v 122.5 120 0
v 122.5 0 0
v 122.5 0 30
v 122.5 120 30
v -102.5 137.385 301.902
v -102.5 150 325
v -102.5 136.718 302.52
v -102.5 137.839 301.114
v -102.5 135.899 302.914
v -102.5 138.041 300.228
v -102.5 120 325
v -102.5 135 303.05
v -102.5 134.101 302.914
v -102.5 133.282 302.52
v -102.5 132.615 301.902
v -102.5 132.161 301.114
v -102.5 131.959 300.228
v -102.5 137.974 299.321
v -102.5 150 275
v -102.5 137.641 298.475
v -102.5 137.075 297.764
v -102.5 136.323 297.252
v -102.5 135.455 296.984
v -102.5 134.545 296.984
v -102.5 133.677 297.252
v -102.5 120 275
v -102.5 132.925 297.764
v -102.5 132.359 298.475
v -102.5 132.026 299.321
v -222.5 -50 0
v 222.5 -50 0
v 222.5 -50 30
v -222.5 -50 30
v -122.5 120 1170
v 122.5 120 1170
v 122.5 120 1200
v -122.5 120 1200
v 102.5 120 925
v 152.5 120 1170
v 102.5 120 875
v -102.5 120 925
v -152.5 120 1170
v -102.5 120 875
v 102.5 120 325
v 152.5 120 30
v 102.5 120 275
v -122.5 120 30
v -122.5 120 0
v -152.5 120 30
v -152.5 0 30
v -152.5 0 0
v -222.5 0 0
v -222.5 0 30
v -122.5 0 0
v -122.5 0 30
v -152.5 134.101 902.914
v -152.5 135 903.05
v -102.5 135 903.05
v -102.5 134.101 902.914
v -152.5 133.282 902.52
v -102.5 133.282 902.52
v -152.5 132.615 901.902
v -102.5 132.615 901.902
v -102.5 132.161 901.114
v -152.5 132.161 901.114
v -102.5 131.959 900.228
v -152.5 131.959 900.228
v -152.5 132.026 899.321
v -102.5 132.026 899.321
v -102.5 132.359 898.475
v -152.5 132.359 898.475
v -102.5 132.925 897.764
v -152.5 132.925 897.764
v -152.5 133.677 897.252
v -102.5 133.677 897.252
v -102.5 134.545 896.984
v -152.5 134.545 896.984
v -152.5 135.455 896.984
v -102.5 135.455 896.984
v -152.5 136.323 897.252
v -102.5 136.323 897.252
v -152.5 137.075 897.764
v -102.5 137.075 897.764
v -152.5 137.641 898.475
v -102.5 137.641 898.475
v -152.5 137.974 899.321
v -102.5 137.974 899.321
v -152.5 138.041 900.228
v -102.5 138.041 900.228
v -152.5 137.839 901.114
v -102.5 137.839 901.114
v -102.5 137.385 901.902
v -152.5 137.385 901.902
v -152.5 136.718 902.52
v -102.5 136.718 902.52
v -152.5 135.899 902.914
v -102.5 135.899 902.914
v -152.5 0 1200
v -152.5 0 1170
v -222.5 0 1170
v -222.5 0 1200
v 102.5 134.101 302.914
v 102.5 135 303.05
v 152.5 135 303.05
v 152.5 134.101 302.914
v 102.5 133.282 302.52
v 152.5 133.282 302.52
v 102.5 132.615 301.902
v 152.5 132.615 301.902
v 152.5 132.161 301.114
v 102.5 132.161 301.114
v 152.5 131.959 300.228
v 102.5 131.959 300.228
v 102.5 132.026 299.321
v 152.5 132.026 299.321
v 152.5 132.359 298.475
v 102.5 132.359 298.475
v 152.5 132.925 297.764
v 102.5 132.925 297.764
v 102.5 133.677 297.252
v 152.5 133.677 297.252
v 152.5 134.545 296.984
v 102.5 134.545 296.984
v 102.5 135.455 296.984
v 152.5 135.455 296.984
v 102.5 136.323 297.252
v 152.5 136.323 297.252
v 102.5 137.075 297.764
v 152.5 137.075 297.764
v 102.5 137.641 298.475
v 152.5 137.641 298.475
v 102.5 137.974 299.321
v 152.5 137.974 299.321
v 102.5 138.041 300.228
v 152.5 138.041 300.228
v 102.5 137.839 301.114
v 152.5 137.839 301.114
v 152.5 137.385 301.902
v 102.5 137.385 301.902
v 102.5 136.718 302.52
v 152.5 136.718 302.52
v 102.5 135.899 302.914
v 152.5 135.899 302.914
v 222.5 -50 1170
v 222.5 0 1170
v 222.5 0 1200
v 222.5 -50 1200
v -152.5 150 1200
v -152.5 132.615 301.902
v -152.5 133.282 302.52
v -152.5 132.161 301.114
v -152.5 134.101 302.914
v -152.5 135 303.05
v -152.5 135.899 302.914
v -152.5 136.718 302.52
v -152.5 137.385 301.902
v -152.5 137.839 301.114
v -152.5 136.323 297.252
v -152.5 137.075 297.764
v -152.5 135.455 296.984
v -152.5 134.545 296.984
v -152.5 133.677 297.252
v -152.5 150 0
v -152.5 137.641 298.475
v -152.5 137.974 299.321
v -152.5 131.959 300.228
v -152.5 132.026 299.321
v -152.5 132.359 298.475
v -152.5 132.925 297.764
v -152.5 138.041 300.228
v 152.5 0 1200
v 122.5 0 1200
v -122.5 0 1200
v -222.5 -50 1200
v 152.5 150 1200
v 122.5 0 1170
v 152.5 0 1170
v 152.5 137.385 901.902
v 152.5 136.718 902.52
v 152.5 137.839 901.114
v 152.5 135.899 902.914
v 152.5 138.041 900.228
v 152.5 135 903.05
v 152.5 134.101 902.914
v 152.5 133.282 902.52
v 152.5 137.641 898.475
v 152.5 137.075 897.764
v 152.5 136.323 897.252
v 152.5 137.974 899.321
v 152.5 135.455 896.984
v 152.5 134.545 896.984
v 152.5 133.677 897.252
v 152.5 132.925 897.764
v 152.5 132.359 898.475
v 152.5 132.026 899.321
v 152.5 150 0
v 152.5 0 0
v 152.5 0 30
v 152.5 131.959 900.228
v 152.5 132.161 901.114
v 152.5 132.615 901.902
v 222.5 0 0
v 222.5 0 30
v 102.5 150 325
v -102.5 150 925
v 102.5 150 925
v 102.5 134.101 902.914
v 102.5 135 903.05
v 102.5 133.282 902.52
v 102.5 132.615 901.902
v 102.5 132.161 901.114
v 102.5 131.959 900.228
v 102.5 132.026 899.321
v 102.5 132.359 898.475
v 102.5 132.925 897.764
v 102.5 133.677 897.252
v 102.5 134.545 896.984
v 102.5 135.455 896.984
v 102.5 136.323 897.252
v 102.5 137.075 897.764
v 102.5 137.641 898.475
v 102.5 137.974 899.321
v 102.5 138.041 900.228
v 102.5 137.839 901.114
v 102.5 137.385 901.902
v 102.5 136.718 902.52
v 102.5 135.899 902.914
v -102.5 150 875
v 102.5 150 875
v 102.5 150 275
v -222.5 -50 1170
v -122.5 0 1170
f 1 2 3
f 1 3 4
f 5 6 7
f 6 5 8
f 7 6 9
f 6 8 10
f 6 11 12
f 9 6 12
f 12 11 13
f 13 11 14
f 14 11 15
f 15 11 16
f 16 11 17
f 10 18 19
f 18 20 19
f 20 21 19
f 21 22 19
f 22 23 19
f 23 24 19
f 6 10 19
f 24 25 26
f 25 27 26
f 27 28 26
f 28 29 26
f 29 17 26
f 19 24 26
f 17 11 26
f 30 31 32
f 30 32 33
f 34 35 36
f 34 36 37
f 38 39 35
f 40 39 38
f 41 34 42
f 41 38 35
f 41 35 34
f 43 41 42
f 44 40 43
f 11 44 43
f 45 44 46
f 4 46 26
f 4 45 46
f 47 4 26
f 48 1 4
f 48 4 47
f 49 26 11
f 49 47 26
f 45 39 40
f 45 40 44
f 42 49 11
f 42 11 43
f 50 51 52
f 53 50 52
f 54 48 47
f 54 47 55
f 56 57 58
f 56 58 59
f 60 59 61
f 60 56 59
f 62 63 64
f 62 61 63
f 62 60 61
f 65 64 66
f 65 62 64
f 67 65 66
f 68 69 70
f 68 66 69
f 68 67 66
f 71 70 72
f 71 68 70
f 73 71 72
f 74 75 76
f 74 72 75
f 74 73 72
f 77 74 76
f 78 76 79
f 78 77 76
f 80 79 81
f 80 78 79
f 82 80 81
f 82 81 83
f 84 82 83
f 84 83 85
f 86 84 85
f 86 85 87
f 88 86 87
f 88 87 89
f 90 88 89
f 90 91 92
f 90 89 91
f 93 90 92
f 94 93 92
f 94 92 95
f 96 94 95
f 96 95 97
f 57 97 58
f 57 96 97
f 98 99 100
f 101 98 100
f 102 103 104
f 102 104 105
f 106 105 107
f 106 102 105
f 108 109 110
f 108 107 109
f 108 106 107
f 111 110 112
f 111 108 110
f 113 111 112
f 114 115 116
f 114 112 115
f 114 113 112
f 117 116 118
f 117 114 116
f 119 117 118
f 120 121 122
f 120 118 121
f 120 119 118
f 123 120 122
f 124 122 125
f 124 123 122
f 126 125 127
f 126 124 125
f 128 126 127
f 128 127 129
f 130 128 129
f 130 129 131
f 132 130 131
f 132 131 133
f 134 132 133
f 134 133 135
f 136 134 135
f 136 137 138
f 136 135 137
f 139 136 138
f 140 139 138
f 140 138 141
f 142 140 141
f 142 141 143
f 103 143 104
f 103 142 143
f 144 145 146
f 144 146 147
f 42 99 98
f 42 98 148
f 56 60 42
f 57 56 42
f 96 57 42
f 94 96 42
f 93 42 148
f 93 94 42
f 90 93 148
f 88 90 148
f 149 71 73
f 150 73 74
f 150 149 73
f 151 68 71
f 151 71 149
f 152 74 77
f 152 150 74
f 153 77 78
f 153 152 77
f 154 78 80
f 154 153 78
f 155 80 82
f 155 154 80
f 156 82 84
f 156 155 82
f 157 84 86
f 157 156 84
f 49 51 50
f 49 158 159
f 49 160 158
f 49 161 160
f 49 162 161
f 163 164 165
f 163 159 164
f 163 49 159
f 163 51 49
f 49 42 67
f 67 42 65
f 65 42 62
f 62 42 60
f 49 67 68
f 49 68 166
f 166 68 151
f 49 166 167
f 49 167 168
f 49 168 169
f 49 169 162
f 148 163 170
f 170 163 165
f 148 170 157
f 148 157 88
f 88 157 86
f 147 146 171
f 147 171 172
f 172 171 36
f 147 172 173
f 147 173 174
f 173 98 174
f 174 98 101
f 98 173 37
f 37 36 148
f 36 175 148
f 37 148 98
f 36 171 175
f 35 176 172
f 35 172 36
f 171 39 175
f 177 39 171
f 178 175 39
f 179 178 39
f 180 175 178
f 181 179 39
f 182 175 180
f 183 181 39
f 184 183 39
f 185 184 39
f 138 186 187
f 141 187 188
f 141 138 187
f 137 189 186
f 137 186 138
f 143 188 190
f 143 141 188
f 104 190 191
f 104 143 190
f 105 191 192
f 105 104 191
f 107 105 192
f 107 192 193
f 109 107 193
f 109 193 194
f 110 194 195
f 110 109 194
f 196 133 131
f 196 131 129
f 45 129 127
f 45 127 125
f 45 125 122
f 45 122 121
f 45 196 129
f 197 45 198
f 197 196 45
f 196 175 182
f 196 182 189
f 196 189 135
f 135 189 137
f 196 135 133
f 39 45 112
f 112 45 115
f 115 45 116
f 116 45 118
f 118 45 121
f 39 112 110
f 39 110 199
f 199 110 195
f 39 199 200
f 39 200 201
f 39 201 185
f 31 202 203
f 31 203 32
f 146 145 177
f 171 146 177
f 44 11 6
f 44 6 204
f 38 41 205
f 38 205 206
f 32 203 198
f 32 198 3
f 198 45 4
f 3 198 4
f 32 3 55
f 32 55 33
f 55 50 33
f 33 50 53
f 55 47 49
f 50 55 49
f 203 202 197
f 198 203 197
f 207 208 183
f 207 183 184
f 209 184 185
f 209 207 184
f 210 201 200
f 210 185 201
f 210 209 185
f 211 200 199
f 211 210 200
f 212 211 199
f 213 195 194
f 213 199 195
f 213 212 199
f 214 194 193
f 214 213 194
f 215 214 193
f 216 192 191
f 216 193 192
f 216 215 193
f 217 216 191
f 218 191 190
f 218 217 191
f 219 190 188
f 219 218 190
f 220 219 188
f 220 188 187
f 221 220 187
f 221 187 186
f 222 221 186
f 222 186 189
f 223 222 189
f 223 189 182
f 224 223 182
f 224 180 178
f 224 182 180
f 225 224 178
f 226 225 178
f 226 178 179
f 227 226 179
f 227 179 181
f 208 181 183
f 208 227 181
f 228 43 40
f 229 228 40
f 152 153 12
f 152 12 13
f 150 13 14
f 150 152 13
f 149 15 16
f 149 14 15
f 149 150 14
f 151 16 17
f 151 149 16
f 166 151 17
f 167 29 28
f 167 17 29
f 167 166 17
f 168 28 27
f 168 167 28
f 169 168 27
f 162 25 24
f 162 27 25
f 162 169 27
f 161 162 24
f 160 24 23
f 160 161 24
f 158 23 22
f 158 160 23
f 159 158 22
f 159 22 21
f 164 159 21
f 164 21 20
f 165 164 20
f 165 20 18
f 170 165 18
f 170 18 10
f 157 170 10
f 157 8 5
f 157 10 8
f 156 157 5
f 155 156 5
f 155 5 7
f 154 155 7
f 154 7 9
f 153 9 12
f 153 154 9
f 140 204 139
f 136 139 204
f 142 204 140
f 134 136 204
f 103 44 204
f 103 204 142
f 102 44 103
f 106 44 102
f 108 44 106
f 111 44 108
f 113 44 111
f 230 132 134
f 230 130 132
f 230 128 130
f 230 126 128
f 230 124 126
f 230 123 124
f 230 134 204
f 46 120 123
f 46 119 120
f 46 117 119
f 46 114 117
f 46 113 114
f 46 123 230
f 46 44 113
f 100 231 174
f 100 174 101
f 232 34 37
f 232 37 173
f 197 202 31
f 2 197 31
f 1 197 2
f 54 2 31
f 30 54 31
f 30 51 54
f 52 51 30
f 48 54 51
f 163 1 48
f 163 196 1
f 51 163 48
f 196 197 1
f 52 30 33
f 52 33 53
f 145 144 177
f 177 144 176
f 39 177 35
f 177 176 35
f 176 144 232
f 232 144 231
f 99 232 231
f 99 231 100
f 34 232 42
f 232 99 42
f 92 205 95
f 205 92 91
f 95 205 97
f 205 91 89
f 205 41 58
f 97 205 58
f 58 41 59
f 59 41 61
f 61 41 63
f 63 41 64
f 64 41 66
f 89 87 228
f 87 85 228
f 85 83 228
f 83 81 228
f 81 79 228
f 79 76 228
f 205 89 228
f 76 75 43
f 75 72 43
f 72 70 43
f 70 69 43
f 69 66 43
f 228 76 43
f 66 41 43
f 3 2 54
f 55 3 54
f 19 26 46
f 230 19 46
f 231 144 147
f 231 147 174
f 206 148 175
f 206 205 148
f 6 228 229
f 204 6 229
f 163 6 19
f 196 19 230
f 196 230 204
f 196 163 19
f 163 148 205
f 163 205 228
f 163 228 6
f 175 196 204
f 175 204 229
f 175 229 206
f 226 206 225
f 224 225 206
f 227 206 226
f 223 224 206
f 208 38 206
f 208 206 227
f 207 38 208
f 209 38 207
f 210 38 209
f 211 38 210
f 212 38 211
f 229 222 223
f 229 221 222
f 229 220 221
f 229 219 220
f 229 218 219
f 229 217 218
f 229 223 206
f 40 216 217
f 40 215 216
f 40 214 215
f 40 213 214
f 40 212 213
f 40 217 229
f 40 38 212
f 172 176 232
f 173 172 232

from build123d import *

# Parameters (mm, degrees)
BOSS_EXTRUDE1_DEPTH     = 1200
BOSS_EXTRUDE2_DEPTH     = 1200
CUT_EXTRUDE1_DEPTH      = 1230.636633319
CUT_EXTRUDE1_DEPTH_BACK = 1230.636633319
SKETCH2_W               = 1140
SKETCH2_H               = 120
CUT_EXTRUDE3_DEPTH      = 1230.636633319
SKETCH4_W               = 205
SKETCH4_H               = 50
CUT_EXTRUDE4_DEPTH      = 1230.636633319
CUT_EXTRUDE5_DEPTH      = 1230.636633319
CUT_EXTRUDE5_DEPTH_BACK = 1230.636633319
SKETCH5_R               = 3.05


with BuildPart() as part:
    # Sketch1 → Boss-Extrude1 (new body)
    with BuildSketch(Plane.XY):
        Polygon((-222.5, -50), (222.5, -50), (222.5, 0), (152.5, 0), (122.5, 0), (-122.5, 0), (-152.5, 0), (-222.5, 0), align=None)
    extrude(amount=BOSS_EXTRUDE1_DEPTH)

    # Sketch1<3> → Boss-Extrude2 (add)
    with BuildSketch(Plane.XY):
        Polygon((122.5, 0), (152.5, 0), (152.5, 150), (-152.5, 150), (-152.5, 0), (-122.5, 0), (-122.5, 120), (122.5, 120), align=None)
    extrude(amount=BOSS_EXTRUDE2_DEPTH)

    # Sketch2 → Cut-Extrude1 (cut, two sides: drawn at the far end of the back side and taken through both)
    with BuildSketch(Plane(origin=(0, 0, 0), x_dir=(0, 0, -1), z_dir=(1, 0, 0)).offset(-CUT_EXTRUDE1_DEPTH_BACK)):
        with Locations((-600, 60)):
            Rectangle(SKETCH2_W, SKETCH2_H)
    extrude(amount=CUT_EXTRUDE1_DEPTH + CUT_EXTRUDE1_DEPTH_BACK, mode=Mode.SUBTRACT)

    # Sketch3 → Cut-Extrude3 (cut, through all)
    with BuildSketch(Plane(origin=(0, 0, 0), x_dir=(1, 0, 0), z_dir=(0, 1, 0))):
        Polygon((-152.5, -30), (-222.5, -30), (-222.5, -1170), (-152.5, -1170), (152.5, -1170), (222.5, -1170), (222.5, -30), (152.5, -30), align=None)
    extrude(amount=-CUT_EXTRUDE3_DEPTH, mode=Mode.SUBTRACT)

    # Sketch4 → Cut-Extrude4 (cut, through all)
    with BuildSketch(Plane(origin=(0, 0, 0), x_dir=(1, 0, 0), z_dir=(0, 1, 0))):
        with Locations((0, -900)):
            Rectangle(SKETCH4_W, SKETCH4_H)
        with Locations((0, -300)):
            Rectangle(SKETCH4_W, SKETCH4_H)
    extrude(amount=CUT_EXTRUDE4_DEPTH, mode=Mode.SUBTRACT)

    # Sketch5 → Cut-Extrude5 (cut, two sides: drawn at the far end of the back side and taken through both)
    with BuildSketch(Plane(origin=(0, 0, 0), x_dir=(0, 0, -1), z_dir=(1, 0, 0)).offset(-CUT_EXTRUDE5_DEPTH_BACK)):
        with Locations((-900, 135)):
            Circle(SKETCH5_R)
        with Locations((-300, 135)):
            Circle(SKETCH5_R)
    extrude(amount=CUT_EXTRUDE5_DEPTH + CUT_EXTRUDE5_DEPTH_BACK, mode=Mode.SUBTRACT)


solid = part.part
